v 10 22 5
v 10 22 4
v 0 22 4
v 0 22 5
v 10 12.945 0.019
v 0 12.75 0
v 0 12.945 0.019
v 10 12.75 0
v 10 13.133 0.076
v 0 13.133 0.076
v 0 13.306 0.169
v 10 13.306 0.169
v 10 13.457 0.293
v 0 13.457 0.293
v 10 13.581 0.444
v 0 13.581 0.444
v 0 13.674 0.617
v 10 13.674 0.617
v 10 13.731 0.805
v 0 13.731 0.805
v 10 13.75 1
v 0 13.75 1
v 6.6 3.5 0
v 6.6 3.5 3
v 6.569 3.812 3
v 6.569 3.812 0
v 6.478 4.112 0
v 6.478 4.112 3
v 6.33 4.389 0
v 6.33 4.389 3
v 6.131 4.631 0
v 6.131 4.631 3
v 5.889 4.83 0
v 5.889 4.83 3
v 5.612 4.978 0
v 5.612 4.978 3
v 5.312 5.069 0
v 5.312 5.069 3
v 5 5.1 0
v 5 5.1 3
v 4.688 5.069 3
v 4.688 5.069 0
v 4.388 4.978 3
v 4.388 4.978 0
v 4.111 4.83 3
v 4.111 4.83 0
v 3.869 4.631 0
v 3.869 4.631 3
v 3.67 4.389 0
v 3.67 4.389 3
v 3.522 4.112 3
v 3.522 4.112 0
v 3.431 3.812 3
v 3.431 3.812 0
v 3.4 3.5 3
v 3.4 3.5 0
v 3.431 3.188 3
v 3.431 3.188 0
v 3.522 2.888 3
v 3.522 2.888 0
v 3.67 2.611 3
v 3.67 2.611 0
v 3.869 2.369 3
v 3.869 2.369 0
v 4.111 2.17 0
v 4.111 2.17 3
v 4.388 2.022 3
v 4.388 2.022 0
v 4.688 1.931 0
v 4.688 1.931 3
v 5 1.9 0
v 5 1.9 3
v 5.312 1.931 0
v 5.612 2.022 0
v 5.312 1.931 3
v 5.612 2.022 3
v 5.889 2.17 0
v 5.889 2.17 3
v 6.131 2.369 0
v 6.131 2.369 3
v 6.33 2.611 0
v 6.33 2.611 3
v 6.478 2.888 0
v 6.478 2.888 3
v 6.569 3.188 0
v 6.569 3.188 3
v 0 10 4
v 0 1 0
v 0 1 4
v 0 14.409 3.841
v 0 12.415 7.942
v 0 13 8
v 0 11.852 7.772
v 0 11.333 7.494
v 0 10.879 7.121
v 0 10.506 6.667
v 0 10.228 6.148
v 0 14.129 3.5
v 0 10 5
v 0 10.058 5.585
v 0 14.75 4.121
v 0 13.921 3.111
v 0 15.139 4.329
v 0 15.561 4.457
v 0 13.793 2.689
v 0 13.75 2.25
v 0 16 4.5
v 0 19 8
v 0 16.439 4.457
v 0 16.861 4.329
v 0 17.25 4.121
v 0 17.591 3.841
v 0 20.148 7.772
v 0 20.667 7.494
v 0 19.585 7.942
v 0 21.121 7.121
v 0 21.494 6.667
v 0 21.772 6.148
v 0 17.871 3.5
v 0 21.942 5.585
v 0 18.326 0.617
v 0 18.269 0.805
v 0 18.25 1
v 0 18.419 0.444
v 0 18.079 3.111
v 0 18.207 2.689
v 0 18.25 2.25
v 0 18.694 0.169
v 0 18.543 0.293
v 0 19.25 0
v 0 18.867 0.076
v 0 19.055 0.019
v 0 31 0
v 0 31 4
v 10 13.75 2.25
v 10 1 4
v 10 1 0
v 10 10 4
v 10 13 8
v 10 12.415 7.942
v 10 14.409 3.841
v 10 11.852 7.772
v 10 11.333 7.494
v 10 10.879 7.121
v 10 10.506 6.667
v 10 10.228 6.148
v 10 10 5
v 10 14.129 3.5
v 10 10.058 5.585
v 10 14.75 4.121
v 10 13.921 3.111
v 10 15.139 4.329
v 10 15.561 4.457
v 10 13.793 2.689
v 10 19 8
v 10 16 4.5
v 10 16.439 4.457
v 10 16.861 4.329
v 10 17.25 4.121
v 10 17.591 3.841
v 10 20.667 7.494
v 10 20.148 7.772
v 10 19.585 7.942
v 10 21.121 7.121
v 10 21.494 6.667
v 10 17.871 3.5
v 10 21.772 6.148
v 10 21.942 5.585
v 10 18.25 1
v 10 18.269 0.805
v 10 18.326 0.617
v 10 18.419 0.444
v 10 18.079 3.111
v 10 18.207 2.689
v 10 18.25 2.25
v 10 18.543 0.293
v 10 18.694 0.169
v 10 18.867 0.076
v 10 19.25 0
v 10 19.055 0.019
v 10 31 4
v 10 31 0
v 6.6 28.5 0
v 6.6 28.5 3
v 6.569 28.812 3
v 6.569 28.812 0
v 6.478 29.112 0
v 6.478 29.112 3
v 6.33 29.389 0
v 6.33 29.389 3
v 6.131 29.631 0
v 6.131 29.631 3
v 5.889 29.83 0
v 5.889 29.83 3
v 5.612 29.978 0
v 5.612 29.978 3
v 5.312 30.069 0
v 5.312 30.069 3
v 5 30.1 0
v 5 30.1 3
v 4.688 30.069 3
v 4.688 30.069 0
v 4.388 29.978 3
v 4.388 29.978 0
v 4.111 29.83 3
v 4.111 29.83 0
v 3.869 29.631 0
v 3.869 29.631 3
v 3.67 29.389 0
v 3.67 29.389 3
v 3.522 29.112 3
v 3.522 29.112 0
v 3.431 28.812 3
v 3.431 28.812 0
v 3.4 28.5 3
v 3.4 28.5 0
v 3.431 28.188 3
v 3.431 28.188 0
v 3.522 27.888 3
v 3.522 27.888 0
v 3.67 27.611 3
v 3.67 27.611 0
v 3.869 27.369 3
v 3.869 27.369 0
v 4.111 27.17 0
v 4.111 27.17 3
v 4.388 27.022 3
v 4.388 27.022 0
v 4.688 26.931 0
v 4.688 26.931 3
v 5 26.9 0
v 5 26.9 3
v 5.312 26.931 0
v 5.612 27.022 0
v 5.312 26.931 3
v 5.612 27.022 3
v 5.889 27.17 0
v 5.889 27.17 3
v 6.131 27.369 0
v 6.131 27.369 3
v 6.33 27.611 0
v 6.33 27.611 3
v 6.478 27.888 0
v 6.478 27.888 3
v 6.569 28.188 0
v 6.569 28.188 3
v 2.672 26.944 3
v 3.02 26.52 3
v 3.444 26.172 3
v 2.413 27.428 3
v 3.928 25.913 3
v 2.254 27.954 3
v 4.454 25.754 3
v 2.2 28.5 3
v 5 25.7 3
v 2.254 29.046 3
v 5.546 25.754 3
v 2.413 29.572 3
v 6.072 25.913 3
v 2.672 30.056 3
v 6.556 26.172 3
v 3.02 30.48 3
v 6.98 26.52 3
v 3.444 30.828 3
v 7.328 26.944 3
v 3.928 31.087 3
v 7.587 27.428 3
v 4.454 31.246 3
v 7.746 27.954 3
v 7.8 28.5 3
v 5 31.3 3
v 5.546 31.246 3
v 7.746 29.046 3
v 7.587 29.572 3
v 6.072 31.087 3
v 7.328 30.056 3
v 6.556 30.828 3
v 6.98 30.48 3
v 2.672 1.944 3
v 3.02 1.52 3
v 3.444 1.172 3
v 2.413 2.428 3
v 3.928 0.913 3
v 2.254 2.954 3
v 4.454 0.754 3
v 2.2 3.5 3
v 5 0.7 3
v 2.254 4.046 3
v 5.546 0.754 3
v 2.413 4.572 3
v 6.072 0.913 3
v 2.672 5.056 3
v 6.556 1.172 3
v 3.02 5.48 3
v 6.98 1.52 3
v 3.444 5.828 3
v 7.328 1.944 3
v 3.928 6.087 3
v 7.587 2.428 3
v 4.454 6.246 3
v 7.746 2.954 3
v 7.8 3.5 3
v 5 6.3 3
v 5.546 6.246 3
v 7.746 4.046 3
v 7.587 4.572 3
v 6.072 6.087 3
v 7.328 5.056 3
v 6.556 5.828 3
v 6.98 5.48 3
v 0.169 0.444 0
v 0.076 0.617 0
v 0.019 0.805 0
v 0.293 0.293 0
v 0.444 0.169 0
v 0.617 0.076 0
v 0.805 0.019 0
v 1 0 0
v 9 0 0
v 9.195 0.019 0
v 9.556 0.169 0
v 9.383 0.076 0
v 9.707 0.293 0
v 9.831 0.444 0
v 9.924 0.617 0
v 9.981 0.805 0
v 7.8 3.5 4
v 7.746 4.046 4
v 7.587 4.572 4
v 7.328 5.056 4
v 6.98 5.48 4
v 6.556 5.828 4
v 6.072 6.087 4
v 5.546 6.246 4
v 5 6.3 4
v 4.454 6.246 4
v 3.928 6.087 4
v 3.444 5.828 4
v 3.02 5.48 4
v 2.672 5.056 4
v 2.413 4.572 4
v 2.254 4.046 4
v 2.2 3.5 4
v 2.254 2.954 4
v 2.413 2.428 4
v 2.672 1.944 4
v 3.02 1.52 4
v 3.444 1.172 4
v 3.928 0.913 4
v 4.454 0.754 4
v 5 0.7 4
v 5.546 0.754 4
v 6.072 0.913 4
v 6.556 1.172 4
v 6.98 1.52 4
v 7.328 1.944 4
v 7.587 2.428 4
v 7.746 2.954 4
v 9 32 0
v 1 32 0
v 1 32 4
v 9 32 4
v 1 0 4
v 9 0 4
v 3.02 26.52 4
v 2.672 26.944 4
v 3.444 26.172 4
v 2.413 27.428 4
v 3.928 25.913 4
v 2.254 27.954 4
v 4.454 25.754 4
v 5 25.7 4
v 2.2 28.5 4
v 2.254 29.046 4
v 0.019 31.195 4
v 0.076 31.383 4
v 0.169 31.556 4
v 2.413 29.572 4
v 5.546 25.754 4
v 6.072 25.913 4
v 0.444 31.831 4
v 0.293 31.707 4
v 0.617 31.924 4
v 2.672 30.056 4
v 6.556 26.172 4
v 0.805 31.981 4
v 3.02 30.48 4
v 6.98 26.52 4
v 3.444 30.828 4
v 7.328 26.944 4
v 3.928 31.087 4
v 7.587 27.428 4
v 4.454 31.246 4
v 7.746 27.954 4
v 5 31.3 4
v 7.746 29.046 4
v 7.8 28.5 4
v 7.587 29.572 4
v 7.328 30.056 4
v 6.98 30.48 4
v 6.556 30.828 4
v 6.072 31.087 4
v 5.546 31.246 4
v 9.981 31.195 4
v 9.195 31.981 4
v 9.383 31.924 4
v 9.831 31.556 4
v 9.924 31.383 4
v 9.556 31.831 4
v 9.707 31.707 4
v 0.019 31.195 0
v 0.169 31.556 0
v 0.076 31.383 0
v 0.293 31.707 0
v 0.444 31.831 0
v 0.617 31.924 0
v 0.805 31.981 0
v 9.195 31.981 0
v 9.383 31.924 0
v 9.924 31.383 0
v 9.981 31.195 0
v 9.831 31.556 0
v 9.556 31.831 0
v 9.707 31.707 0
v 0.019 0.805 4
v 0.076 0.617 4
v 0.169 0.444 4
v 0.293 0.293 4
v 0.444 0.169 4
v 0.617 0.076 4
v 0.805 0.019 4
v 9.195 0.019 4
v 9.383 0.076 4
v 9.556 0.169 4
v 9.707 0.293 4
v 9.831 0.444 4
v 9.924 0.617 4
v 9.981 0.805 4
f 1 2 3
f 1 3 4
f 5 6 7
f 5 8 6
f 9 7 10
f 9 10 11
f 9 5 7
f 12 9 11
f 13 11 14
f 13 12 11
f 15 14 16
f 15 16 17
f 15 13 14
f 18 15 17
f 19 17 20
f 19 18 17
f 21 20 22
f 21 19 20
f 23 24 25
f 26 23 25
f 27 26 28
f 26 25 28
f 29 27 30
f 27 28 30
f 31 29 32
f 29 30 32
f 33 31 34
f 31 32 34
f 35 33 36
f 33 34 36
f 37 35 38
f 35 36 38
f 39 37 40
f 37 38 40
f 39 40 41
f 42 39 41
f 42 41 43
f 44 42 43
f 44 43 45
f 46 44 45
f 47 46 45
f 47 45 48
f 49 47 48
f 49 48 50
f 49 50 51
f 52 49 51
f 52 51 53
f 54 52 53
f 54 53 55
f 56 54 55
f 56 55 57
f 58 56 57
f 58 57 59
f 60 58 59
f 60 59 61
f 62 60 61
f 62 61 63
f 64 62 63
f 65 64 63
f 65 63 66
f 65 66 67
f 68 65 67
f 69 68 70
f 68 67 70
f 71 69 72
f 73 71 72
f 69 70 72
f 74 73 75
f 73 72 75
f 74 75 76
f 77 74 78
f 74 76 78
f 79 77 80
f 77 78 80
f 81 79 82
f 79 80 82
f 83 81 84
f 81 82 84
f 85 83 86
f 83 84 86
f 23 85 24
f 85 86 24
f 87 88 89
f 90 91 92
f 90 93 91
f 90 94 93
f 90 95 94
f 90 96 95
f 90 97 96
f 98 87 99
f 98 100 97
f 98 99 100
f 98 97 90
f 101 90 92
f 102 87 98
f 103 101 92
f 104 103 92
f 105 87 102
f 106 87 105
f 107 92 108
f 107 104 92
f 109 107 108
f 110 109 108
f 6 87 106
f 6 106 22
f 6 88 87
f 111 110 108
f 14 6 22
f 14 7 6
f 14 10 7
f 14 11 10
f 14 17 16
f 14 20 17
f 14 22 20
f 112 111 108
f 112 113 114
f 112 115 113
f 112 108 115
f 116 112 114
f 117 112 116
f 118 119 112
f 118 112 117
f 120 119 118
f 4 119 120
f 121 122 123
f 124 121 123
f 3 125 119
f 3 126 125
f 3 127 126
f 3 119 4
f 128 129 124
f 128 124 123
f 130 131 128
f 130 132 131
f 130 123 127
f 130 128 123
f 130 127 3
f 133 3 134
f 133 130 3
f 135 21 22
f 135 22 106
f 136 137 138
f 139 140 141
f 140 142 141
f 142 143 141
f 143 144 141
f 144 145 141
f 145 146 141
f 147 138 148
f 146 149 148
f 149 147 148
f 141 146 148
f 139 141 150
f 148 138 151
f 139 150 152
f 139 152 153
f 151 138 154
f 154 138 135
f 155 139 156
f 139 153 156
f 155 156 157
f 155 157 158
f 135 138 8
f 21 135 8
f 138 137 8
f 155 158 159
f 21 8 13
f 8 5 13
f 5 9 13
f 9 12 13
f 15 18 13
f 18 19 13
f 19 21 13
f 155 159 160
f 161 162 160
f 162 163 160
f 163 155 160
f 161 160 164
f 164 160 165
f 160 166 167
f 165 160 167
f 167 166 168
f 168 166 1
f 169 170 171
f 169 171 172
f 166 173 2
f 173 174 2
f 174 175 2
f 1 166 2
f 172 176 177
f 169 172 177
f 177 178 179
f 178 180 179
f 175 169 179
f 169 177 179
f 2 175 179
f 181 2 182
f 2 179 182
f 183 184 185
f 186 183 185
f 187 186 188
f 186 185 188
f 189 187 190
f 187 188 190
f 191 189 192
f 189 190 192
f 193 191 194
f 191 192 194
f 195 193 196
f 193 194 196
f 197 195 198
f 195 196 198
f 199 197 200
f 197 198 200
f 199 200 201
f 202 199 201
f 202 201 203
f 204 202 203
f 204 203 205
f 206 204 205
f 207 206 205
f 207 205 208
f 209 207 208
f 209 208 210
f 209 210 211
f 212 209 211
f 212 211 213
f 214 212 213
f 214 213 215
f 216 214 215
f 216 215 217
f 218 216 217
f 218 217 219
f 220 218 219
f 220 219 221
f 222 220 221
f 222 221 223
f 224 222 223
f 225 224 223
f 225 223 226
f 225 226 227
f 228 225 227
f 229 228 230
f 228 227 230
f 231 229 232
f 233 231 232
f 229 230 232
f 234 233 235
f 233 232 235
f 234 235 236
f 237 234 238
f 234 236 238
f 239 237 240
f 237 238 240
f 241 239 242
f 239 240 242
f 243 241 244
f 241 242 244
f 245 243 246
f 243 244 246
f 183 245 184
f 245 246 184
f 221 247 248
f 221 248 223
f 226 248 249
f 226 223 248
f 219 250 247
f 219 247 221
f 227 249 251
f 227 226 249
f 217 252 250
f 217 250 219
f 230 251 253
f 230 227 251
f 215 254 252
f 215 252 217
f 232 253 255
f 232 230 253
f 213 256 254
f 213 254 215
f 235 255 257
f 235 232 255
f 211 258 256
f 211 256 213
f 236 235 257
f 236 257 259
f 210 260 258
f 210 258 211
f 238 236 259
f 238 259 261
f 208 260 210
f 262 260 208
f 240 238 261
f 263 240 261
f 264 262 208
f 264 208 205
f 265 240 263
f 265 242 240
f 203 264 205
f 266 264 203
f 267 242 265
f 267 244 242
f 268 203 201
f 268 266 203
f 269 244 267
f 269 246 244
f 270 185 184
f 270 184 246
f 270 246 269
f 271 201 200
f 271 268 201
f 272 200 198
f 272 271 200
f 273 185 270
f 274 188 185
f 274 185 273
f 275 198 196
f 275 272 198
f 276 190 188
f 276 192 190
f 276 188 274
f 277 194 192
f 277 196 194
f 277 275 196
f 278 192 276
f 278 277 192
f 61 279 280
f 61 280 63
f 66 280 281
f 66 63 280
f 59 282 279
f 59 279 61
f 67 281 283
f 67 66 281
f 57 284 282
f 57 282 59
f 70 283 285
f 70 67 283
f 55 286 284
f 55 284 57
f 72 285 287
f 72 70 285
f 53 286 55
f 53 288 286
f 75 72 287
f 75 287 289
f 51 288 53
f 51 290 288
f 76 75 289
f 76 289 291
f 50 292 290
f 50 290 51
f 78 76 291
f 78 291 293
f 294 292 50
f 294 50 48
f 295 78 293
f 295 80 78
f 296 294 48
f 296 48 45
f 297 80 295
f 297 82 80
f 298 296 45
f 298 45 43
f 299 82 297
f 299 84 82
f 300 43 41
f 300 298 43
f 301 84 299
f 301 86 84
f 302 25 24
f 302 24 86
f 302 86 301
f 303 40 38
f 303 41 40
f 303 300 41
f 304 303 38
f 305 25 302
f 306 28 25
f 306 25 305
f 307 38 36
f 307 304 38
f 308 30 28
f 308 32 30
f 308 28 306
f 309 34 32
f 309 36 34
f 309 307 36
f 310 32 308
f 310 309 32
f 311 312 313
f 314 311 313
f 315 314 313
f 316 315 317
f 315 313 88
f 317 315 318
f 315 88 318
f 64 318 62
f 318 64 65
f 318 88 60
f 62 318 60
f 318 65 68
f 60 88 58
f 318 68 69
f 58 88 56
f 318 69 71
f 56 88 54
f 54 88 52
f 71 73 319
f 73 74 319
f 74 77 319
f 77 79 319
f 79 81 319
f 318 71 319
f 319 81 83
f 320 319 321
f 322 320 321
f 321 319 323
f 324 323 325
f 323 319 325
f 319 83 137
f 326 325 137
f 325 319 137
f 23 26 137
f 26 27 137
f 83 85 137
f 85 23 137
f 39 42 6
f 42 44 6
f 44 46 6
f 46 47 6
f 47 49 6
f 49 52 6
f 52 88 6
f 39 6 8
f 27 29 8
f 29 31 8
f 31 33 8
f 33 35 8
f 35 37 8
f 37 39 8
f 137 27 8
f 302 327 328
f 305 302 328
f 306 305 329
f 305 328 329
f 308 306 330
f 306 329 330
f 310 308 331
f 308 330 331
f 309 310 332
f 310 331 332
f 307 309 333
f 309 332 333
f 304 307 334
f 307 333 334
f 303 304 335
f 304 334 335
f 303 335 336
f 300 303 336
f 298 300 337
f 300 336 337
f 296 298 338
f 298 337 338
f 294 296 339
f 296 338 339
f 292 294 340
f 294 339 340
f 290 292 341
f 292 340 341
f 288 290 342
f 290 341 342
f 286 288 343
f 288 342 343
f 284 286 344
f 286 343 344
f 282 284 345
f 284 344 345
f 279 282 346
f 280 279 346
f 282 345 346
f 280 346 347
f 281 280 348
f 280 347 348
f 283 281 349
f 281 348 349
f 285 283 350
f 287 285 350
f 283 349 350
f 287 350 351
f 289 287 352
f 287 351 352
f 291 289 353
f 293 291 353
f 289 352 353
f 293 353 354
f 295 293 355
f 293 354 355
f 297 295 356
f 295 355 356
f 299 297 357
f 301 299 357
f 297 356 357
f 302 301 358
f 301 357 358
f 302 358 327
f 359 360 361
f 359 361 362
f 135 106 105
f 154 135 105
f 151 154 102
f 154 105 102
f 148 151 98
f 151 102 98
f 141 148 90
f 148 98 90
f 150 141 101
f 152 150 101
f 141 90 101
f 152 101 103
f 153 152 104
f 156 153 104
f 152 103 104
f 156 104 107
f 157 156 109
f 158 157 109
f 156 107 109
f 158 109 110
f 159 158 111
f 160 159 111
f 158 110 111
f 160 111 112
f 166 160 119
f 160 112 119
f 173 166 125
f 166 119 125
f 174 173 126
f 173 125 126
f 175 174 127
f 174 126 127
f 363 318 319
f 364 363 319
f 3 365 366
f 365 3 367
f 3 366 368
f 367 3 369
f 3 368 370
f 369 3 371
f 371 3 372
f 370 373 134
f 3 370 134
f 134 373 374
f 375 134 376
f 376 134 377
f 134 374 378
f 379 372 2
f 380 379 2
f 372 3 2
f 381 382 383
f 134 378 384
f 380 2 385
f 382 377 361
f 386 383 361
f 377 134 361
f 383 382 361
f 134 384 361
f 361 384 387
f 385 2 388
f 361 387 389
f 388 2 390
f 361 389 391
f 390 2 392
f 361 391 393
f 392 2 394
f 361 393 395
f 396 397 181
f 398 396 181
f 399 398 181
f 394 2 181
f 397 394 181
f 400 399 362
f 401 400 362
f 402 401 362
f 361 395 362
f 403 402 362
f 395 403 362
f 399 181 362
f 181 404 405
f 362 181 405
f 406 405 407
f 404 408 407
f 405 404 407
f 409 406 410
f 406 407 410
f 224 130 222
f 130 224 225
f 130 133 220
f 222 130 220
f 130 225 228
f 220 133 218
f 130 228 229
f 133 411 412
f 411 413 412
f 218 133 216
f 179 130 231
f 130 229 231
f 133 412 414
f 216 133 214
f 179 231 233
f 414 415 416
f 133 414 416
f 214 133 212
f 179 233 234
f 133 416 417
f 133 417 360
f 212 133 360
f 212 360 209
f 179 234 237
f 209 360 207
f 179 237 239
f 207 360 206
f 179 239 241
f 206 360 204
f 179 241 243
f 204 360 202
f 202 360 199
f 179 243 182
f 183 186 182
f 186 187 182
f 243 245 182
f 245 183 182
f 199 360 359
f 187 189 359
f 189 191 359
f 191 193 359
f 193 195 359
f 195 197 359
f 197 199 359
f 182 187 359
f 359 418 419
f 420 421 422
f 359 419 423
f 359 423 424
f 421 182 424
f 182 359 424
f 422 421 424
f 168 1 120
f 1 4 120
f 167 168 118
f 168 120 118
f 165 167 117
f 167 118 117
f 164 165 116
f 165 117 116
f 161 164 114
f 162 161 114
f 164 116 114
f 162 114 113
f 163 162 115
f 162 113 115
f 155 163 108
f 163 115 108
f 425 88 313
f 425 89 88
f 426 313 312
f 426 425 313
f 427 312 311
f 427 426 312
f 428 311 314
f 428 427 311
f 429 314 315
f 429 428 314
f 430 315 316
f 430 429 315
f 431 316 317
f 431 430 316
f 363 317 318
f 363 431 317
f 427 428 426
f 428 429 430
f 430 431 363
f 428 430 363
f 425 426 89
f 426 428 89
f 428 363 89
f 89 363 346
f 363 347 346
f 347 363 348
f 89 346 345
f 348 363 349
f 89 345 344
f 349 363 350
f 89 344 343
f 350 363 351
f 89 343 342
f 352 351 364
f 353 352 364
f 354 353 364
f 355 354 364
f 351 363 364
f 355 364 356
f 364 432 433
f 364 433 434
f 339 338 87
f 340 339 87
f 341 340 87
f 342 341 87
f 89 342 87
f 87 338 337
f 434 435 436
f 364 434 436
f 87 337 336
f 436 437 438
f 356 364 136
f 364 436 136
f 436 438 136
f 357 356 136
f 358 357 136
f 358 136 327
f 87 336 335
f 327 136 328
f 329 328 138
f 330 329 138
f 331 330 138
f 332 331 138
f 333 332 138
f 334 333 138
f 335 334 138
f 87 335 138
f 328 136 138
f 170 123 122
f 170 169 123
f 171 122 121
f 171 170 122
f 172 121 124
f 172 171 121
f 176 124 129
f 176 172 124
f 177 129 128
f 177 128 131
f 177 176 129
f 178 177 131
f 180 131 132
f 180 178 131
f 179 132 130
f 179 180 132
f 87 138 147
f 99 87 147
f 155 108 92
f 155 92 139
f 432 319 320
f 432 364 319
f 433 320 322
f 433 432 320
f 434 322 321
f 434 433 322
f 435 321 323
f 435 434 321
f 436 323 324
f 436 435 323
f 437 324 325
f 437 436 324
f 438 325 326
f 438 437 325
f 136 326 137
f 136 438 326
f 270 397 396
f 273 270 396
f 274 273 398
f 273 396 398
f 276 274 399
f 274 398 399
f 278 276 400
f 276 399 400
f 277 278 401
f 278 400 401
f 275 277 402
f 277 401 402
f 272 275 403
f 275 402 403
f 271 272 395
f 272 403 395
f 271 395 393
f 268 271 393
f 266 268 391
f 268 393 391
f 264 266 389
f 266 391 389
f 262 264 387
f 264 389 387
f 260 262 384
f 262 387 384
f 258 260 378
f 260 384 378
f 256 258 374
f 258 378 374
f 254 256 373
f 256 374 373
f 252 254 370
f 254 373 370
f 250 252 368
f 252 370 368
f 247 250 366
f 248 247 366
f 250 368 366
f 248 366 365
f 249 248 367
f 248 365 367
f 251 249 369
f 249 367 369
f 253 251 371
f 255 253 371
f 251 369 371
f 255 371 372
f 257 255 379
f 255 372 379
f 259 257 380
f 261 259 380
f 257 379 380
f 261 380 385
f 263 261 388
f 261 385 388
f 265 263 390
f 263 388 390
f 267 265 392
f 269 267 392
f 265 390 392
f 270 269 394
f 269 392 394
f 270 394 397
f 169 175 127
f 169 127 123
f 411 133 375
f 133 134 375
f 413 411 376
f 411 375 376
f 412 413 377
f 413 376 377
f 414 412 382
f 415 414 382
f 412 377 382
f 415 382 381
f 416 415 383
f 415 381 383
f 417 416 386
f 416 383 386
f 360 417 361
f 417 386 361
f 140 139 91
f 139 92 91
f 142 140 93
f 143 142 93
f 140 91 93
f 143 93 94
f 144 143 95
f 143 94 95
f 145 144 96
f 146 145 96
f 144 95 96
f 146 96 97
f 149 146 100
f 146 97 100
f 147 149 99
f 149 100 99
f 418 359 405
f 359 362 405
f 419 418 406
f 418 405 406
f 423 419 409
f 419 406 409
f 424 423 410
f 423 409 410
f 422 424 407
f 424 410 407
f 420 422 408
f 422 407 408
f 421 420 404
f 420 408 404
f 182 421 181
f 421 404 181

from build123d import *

# Parameters (mm, degrees)
CROQUIS1_W              = 10
CROQUIS1_H              = 32
SALIENTE_EXTRUIR1_DEPTH = 8
CROQUIS2_R              = 1.6
CORTAR_EXTRUIR1_DEPTH   = 8
CROQUIS3_R              = 2.25
CORTAR_EXTRUIR2_DEPTH   = 10
REDONDEO1_R             = 1
CORTAR_EXTRUIR3_START   = -10
CROQUIS4_W              = 4
CROQUIS4_H              = 10
CORTAR_EXTRUIR3_DEPTH   = 10
REDONDEO2_R             = 3
REDONDEO3_R             = 1
CROQUIS5_R              = 2.8
CORTAR_EXTRUIR4_DEPTH   = 1


with BuildPart() as part:
    # Croquis1 → Saliente-Extruir1 (new body)
    with BuildSketch(Plane.XY):
        with Locations((5, 16)):
            Rectangle(CROQUIS1_W, CROQUIS1_H)
    extrude(amount=SALIENTE_EXTRUIR1_DEPTH)

    # Croquis2 → Cortar-Extruir1 (cut)
    with BuildSketch(Plane.XY.offset(8)):
        with Locations((5, 28.5)):
            Circle(CROQUIS2_R)
        with Locations((5, 3.5)):
            Circle(CROQUIS2_R)
    extrude(amount=-CORTAR_EXTRUIR1_DEPTH, mode=Mode.SUBTRACT)

    # Croquis3 → Cortar-Extruir2 (cut)
    with BuildSketch(Plane.ZY):
        with Locations((2.25, 16)):
            Circle(CROQUIS3_R)
        with BuildLine():
            ThreePointArc((0, 16.000000003), (0.659009743, 17.590990259), (2.25, 18.25))
            Line((2.25, 18.25), (0, 18.25))
            Line((0, 18.25), (0, 16.000000003))
        make_face()
        with BuildLine():
            ThreePointArc((2.25, 13.75), (0.659009741, 14.409009743), (0, 16.000000003))
            Line((0, 16.000000003), (0, 13.75))
            Line((0, 13.75), (2.25, 13.75))
        make_face()
    extrude(amount=-CORTAR_EXTRUIR2_DEPTH, mode=Mode.SUBTRACT)

    # Redondeo1
    redondeo1_edges = [part.edges().sort_by_distance(p)[0] for p in [
        (5, 13.75, 0),
        (5, 18.25, 0),
    ]]
    fillet(redondeo1_edges, radius=REDONDEO1_R)

    # Croquis4 → Cortar-Extruir3 (cut)
    with BuildSketch(Plane.ZY.offset(CORTAR_EXTRUIR3_START)):
        with Locations((6, 27)):
            Rectangle(CROQUIS4_W, CROQUIS4_H)
        with Locations((6, 5)):
            Rectangle(CROQUIS4_W, CROQUIS4_H)
    extrude(amount=CORTAR_EXTRUIR3_DEPTH, mode=Mode.SUBTRACT)

    # Redondeo2
    redondeo2_edges = [part.edges().sort_by_distance(p)[0] for p in [
        (5, 22, 8),
        (5, 10, 8),
    ]]
    fillet(redondeo2_edges, radius=REDONDEO2_R)

    # Redondeo3
    redondeo3_edges = [part.edges().sort_by_distance(p)[0] for p in [
        (0, 32, 2),
        (10, 32, 2),
        (10, 0, 2),
        (0, 0, 2),
    ]]
    fillet(redondeo3_edges, radius=REDONDEO3_R)

    # Croquis5 → Cortar-Extruir4 (cut)
    with BuildSketch(Plane.XY.offset(4)):
        with Locations((5, 28.5)):
            Circle(CROQUIS5_R)
        with Locations((5, 3.5)):
            Circle(CROQUIS5_R)
    extrude(amount=-CORTAR_EXTRUIR4_DEPTH, mode=Mode.SUBTRACT)


solid = part.part
